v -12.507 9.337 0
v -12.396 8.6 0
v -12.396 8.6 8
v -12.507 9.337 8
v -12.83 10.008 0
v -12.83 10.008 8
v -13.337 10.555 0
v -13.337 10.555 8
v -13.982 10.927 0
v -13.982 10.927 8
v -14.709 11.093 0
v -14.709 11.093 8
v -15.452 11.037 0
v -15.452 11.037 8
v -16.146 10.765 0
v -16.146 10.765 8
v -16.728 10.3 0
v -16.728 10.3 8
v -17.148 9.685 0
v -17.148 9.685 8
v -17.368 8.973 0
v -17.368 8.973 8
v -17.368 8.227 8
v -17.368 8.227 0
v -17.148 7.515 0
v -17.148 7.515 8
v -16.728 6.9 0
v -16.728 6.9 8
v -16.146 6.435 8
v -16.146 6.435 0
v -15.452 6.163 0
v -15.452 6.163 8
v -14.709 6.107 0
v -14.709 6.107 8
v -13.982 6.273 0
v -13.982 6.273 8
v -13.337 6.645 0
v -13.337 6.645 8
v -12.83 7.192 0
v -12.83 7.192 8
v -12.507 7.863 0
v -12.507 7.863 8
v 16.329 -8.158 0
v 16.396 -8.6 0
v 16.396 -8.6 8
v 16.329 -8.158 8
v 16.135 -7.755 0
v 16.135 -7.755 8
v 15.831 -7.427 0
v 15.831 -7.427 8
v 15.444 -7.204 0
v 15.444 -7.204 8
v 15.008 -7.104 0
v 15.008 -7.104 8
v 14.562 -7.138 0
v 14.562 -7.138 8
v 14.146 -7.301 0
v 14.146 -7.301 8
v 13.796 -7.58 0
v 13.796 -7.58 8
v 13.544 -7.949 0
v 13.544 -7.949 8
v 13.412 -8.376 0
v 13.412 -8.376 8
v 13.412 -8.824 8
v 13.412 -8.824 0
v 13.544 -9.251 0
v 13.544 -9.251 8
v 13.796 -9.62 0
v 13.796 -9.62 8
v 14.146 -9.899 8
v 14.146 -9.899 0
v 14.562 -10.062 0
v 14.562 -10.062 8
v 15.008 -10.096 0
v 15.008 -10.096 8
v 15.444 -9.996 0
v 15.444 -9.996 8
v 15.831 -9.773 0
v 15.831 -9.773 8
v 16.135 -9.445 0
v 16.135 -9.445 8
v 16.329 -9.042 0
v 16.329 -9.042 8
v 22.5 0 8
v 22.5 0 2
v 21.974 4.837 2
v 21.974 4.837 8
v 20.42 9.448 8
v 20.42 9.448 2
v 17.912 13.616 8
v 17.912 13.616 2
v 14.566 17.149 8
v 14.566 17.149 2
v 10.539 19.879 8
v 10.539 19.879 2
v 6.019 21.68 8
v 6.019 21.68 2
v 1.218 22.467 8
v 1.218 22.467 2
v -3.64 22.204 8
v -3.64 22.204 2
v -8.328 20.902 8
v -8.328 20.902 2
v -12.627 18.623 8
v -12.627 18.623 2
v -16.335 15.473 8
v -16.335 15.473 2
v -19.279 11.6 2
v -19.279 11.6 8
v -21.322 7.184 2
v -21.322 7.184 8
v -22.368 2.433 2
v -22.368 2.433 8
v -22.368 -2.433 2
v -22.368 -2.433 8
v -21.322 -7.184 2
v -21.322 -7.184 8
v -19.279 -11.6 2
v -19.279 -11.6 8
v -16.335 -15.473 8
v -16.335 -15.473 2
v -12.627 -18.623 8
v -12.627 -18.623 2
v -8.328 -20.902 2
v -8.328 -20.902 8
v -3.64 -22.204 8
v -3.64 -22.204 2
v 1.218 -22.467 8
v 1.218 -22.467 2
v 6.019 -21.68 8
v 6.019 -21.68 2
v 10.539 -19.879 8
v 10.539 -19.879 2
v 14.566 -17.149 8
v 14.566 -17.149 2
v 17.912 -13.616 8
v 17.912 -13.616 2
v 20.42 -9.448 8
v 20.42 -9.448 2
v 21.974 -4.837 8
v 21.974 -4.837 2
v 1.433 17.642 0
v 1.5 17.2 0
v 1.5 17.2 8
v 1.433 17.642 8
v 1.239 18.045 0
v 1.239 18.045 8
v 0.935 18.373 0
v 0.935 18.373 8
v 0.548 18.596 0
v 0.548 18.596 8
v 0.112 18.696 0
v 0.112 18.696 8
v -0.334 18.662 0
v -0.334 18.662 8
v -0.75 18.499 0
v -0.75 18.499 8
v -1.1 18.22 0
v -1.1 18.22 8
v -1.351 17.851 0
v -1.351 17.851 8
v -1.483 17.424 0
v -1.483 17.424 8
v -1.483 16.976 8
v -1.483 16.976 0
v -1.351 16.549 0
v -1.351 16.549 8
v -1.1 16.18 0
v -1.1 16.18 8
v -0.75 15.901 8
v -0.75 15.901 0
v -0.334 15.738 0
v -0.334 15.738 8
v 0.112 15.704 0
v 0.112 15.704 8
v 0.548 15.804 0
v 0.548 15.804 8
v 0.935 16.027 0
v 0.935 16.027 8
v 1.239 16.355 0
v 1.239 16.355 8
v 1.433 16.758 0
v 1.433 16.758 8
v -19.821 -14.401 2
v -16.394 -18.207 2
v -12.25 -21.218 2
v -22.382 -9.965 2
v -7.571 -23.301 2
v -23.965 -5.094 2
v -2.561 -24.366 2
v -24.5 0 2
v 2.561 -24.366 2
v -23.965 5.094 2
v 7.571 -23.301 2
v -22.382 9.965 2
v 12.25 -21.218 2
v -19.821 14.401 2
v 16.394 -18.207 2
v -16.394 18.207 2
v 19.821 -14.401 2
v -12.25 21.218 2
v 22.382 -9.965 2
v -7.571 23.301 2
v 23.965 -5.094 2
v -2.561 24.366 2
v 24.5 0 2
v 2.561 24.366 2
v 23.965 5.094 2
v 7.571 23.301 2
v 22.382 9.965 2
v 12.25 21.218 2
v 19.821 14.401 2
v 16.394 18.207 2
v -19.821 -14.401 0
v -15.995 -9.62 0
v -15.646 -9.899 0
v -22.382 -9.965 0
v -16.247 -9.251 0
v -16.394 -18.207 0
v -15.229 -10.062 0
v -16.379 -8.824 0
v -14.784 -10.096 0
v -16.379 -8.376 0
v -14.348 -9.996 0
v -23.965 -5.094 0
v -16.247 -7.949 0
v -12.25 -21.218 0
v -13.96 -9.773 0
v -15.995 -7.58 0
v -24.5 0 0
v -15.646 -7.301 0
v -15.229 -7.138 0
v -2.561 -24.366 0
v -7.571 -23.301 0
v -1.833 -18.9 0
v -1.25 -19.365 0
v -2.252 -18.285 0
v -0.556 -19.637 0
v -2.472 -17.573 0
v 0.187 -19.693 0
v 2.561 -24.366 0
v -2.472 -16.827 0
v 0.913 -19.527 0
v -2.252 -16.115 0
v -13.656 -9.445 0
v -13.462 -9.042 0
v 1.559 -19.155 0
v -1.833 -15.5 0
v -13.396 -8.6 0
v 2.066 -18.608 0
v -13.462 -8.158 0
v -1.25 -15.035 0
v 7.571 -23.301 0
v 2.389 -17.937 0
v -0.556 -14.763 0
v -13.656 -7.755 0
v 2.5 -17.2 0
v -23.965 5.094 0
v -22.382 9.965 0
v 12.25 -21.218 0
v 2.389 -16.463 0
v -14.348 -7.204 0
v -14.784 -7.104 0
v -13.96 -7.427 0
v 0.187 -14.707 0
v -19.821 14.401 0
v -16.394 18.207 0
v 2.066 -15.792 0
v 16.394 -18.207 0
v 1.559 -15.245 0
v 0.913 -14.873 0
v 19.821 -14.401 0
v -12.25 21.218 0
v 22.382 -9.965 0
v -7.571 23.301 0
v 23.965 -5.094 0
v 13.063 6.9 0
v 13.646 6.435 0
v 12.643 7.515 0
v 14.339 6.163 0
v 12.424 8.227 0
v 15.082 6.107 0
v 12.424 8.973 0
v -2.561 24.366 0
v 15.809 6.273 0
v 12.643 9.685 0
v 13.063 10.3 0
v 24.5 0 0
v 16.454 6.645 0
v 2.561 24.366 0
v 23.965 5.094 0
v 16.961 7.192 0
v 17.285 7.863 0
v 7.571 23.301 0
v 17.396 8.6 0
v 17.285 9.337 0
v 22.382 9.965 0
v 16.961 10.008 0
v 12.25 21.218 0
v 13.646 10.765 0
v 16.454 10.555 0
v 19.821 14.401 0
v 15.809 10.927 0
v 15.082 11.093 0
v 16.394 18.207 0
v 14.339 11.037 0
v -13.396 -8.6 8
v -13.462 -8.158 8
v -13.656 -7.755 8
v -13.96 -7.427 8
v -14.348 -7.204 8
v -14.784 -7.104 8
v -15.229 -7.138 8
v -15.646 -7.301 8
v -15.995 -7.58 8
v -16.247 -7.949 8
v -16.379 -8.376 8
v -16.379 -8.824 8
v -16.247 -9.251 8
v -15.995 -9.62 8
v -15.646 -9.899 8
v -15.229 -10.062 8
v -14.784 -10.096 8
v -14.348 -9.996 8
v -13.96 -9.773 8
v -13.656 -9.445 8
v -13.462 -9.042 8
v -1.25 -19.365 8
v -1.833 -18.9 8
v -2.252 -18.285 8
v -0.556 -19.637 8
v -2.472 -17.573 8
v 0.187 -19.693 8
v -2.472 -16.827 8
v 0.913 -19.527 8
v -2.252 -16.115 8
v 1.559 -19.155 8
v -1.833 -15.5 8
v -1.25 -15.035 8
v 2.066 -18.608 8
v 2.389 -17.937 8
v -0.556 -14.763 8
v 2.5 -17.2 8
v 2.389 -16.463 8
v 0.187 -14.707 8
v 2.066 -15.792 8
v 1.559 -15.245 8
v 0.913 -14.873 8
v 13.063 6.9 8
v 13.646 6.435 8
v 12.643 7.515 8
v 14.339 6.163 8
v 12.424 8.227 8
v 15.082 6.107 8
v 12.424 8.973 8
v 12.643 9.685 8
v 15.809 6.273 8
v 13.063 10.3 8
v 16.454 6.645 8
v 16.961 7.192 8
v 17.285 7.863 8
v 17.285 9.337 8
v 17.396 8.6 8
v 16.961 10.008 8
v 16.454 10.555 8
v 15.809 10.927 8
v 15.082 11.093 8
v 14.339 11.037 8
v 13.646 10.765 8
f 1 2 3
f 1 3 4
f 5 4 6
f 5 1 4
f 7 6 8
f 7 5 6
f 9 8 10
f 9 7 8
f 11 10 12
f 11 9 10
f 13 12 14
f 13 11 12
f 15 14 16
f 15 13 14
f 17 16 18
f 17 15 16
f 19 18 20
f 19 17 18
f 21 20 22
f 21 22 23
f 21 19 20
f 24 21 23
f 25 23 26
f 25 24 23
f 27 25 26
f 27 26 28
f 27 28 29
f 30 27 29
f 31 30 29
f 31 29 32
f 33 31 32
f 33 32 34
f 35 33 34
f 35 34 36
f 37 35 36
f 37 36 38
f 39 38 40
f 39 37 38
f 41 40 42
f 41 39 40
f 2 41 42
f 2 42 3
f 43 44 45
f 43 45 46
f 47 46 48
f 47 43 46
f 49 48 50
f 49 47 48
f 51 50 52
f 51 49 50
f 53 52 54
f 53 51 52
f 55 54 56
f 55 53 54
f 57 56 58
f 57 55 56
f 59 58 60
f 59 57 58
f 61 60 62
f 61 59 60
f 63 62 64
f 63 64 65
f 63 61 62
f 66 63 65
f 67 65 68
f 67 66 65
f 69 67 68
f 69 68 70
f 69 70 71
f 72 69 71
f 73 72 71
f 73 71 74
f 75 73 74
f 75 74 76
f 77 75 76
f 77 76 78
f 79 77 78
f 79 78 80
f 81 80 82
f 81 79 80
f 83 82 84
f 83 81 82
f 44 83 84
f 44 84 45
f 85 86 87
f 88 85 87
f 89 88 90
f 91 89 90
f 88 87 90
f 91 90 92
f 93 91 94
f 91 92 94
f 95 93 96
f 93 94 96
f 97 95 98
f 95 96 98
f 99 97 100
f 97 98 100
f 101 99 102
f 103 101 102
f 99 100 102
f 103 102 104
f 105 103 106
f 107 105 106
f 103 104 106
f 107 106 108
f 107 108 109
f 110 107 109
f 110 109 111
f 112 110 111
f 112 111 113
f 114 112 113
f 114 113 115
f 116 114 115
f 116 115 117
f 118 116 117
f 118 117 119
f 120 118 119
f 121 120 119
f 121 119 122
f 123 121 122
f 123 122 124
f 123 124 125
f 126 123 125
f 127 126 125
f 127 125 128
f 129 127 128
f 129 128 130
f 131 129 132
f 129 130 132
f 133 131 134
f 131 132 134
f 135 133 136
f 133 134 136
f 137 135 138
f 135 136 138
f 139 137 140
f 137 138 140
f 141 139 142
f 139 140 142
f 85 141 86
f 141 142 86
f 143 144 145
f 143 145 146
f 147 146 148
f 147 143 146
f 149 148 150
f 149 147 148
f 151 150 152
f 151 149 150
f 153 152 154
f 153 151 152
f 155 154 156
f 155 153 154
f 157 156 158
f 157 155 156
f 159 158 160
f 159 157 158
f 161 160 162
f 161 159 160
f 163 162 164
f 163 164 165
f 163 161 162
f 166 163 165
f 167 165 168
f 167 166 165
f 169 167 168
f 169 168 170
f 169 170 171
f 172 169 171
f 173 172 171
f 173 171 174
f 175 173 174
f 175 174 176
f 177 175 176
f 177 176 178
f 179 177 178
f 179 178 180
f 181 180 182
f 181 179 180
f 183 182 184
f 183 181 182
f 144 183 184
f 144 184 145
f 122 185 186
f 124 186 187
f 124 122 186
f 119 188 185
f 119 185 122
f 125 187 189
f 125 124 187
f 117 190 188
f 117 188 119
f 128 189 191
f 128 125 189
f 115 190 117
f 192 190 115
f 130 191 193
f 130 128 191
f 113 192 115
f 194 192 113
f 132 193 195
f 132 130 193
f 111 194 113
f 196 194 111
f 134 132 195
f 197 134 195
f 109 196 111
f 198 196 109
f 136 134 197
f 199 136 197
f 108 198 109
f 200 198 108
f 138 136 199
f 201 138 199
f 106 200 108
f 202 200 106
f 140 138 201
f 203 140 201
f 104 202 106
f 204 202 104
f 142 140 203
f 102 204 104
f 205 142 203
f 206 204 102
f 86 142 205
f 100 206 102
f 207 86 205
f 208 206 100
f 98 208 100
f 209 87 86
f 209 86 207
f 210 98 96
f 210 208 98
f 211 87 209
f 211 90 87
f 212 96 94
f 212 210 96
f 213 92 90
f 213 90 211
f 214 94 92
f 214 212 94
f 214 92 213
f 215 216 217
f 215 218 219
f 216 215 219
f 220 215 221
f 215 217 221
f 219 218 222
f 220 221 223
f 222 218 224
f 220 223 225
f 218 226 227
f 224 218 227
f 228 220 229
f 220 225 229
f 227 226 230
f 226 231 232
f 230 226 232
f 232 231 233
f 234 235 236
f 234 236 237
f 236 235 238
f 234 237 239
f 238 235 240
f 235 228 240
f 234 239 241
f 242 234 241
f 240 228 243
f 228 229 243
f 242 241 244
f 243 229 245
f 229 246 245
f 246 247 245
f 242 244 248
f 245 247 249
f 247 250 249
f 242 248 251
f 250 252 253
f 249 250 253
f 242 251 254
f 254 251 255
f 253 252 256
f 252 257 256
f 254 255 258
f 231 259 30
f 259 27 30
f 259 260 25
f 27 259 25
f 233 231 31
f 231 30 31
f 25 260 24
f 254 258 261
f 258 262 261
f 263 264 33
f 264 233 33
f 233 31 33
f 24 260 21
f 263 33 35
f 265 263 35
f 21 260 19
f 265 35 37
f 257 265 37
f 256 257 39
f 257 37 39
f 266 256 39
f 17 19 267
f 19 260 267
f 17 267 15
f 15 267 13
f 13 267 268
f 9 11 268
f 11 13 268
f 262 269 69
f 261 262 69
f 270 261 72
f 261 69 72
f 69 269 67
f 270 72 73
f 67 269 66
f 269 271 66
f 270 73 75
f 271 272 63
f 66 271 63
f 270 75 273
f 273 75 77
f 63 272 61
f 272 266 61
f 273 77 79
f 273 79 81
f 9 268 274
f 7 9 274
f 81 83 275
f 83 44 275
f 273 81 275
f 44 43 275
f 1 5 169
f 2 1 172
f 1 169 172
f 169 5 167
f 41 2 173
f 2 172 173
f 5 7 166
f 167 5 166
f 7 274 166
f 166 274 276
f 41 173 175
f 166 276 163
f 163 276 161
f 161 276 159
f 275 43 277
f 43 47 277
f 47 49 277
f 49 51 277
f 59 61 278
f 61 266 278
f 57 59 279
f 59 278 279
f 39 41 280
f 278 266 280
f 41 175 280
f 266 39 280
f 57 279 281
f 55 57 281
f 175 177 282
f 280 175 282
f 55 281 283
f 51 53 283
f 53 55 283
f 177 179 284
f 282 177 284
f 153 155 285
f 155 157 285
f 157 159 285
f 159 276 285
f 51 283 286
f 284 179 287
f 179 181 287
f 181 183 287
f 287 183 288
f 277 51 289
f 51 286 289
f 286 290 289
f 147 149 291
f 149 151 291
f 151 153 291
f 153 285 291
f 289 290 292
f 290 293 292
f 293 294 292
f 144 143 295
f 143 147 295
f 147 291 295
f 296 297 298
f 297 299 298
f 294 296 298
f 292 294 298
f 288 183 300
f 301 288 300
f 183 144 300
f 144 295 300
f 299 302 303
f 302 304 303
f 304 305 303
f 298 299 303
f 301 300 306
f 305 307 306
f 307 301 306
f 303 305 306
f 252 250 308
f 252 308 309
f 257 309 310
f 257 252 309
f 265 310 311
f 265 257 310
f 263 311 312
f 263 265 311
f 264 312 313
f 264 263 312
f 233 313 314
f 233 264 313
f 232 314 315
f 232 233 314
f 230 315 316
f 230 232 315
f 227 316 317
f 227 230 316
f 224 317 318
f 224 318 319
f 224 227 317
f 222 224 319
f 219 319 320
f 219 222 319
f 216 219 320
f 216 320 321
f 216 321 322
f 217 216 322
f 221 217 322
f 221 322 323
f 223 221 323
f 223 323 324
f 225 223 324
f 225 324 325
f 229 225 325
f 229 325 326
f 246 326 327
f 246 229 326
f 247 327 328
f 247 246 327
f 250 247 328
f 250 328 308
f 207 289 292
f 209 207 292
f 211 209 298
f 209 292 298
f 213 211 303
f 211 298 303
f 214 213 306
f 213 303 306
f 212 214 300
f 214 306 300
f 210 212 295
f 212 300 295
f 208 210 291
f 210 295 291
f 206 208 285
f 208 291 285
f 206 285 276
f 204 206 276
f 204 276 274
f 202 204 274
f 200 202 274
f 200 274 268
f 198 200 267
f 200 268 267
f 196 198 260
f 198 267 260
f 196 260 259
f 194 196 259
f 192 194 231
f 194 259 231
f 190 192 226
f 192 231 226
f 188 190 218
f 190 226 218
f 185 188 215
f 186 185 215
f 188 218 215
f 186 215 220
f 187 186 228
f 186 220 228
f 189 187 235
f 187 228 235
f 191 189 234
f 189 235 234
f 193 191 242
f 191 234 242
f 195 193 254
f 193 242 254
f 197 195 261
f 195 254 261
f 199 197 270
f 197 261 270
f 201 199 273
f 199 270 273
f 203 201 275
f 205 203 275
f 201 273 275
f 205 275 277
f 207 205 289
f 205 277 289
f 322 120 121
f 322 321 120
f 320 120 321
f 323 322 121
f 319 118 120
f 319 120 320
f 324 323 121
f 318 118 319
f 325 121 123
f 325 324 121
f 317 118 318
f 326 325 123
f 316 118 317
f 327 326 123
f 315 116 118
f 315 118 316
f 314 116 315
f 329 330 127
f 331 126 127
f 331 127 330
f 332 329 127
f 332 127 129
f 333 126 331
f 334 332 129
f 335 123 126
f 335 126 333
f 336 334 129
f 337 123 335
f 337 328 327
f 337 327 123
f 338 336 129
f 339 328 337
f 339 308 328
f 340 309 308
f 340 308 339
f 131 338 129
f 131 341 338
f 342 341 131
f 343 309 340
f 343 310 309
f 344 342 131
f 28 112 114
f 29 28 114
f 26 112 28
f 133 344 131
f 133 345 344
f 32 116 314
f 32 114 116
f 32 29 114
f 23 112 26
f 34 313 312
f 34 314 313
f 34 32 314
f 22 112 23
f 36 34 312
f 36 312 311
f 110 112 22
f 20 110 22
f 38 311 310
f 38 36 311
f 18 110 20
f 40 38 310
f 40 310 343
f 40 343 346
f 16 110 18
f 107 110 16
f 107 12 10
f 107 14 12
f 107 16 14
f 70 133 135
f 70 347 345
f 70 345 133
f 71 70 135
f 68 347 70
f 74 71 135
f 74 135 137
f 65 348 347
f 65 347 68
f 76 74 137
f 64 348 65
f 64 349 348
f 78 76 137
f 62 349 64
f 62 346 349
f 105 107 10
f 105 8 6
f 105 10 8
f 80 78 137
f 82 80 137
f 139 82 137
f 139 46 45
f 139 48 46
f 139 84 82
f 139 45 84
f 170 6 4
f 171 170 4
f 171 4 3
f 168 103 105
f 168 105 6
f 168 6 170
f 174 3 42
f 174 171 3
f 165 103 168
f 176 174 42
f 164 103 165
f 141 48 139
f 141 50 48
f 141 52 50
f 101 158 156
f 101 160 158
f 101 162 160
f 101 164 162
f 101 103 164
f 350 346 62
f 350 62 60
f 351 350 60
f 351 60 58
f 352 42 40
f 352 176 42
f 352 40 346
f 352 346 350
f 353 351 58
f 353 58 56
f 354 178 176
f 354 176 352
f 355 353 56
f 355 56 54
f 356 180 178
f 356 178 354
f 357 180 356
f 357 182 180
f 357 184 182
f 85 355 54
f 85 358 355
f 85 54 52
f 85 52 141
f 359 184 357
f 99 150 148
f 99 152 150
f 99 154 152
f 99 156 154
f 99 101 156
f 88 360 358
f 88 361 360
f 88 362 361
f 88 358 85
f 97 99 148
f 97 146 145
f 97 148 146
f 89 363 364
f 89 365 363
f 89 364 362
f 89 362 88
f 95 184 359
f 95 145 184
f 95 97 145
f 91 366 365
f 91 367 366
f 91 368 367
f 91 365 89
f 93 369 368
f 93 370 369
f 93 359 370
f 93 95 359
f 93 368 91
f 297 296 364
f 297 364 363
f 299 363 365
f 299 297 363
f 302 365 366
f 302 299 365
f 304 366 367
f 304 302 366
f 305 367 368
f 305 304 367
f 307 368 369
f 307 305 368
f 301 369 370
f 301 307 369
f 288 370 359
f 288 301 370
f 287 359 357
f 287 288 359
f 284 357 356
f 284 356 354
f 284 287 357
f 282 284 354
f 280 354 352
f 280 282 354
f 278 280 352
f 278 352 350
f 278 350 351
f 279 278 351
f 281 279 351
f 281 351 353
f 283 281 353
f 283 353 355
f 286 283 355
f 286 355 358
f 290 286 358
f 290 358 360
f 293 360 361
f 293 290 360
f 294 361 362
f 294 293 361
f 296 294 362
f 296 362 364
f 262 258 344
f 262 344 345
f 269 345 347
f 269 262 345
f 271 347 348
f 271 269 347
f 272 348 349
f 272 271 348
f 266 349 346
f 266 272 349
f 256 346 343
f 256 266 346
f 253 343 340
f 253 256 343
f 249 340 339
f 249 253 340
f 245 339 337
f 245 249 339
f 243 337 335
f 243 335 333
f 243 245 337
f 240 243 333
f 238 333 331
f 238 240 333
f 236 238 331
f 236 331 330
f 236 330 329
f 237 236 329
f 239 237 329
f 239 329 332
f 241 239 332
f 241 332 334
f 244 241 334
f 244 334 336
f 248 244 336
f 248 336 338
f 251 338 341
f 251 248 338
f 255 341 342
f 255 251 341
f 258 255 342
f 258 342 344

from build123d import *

# Parameters (mm, degrees)
SKETCH1_R           = 24.5
SKETCH1_R_2         = 22.5
BOSS_EXTRUDE1_DEPTH = 2
SKETCH1_3_R         = 22.5
SKETCH1_3_R_2       = 2.5
SKETCH1_3_R_3       = 1.5
BOSS_EXTRUDE2_DEPTH = 8


with BuildPart() as part:
    # Sketch1 → Boss-Extrude1 (new body)
    with BuildSketch(Plane.XY):
        Circle(SKETCH1_R)
        Circle(SKETCH1_R_2, mode=Mode.SUBTRACT)
    extrude(amount=BOSS_EXTRUDE1_DEPTH)

    # Sketch1<3> → Boss-Extrude2 (add)
    with BuildSketch(Plane.XY):
        Circle(SKETCH1_3_R)
        with Locations((14.895636945, 8.6)):
            Circle(SKETCH1_3_R_2, mode=Mode.SUBTRACT)
        with Locations((-14.895636945, 8.6)):
            Circle(SKETCH1_3_R_2, mode=Mode.SUBTRACT)
        with Locations((0, -17.2)):
            Circle(SKETCH1_3_R_2, mode=Mode.SUBTRACT)
        with Locations((-14.895636945, -8.6)):
            Circle(SKETCH1_3_R_3, mode=Mode.SUBTRACT)
        with Locations((14.895636945, -8.6)):
            Circle(SKETCH1_3_R_3, mode=Mode.SUBTRACT)
        with Locations((0, 17.2)):
            Circle(SKETCH1_3_R_3, mode=Mode.SUBTRACT)
    extrude(amount=BOSS_EXTRUDE2_DEPTH)


solid = part.part
